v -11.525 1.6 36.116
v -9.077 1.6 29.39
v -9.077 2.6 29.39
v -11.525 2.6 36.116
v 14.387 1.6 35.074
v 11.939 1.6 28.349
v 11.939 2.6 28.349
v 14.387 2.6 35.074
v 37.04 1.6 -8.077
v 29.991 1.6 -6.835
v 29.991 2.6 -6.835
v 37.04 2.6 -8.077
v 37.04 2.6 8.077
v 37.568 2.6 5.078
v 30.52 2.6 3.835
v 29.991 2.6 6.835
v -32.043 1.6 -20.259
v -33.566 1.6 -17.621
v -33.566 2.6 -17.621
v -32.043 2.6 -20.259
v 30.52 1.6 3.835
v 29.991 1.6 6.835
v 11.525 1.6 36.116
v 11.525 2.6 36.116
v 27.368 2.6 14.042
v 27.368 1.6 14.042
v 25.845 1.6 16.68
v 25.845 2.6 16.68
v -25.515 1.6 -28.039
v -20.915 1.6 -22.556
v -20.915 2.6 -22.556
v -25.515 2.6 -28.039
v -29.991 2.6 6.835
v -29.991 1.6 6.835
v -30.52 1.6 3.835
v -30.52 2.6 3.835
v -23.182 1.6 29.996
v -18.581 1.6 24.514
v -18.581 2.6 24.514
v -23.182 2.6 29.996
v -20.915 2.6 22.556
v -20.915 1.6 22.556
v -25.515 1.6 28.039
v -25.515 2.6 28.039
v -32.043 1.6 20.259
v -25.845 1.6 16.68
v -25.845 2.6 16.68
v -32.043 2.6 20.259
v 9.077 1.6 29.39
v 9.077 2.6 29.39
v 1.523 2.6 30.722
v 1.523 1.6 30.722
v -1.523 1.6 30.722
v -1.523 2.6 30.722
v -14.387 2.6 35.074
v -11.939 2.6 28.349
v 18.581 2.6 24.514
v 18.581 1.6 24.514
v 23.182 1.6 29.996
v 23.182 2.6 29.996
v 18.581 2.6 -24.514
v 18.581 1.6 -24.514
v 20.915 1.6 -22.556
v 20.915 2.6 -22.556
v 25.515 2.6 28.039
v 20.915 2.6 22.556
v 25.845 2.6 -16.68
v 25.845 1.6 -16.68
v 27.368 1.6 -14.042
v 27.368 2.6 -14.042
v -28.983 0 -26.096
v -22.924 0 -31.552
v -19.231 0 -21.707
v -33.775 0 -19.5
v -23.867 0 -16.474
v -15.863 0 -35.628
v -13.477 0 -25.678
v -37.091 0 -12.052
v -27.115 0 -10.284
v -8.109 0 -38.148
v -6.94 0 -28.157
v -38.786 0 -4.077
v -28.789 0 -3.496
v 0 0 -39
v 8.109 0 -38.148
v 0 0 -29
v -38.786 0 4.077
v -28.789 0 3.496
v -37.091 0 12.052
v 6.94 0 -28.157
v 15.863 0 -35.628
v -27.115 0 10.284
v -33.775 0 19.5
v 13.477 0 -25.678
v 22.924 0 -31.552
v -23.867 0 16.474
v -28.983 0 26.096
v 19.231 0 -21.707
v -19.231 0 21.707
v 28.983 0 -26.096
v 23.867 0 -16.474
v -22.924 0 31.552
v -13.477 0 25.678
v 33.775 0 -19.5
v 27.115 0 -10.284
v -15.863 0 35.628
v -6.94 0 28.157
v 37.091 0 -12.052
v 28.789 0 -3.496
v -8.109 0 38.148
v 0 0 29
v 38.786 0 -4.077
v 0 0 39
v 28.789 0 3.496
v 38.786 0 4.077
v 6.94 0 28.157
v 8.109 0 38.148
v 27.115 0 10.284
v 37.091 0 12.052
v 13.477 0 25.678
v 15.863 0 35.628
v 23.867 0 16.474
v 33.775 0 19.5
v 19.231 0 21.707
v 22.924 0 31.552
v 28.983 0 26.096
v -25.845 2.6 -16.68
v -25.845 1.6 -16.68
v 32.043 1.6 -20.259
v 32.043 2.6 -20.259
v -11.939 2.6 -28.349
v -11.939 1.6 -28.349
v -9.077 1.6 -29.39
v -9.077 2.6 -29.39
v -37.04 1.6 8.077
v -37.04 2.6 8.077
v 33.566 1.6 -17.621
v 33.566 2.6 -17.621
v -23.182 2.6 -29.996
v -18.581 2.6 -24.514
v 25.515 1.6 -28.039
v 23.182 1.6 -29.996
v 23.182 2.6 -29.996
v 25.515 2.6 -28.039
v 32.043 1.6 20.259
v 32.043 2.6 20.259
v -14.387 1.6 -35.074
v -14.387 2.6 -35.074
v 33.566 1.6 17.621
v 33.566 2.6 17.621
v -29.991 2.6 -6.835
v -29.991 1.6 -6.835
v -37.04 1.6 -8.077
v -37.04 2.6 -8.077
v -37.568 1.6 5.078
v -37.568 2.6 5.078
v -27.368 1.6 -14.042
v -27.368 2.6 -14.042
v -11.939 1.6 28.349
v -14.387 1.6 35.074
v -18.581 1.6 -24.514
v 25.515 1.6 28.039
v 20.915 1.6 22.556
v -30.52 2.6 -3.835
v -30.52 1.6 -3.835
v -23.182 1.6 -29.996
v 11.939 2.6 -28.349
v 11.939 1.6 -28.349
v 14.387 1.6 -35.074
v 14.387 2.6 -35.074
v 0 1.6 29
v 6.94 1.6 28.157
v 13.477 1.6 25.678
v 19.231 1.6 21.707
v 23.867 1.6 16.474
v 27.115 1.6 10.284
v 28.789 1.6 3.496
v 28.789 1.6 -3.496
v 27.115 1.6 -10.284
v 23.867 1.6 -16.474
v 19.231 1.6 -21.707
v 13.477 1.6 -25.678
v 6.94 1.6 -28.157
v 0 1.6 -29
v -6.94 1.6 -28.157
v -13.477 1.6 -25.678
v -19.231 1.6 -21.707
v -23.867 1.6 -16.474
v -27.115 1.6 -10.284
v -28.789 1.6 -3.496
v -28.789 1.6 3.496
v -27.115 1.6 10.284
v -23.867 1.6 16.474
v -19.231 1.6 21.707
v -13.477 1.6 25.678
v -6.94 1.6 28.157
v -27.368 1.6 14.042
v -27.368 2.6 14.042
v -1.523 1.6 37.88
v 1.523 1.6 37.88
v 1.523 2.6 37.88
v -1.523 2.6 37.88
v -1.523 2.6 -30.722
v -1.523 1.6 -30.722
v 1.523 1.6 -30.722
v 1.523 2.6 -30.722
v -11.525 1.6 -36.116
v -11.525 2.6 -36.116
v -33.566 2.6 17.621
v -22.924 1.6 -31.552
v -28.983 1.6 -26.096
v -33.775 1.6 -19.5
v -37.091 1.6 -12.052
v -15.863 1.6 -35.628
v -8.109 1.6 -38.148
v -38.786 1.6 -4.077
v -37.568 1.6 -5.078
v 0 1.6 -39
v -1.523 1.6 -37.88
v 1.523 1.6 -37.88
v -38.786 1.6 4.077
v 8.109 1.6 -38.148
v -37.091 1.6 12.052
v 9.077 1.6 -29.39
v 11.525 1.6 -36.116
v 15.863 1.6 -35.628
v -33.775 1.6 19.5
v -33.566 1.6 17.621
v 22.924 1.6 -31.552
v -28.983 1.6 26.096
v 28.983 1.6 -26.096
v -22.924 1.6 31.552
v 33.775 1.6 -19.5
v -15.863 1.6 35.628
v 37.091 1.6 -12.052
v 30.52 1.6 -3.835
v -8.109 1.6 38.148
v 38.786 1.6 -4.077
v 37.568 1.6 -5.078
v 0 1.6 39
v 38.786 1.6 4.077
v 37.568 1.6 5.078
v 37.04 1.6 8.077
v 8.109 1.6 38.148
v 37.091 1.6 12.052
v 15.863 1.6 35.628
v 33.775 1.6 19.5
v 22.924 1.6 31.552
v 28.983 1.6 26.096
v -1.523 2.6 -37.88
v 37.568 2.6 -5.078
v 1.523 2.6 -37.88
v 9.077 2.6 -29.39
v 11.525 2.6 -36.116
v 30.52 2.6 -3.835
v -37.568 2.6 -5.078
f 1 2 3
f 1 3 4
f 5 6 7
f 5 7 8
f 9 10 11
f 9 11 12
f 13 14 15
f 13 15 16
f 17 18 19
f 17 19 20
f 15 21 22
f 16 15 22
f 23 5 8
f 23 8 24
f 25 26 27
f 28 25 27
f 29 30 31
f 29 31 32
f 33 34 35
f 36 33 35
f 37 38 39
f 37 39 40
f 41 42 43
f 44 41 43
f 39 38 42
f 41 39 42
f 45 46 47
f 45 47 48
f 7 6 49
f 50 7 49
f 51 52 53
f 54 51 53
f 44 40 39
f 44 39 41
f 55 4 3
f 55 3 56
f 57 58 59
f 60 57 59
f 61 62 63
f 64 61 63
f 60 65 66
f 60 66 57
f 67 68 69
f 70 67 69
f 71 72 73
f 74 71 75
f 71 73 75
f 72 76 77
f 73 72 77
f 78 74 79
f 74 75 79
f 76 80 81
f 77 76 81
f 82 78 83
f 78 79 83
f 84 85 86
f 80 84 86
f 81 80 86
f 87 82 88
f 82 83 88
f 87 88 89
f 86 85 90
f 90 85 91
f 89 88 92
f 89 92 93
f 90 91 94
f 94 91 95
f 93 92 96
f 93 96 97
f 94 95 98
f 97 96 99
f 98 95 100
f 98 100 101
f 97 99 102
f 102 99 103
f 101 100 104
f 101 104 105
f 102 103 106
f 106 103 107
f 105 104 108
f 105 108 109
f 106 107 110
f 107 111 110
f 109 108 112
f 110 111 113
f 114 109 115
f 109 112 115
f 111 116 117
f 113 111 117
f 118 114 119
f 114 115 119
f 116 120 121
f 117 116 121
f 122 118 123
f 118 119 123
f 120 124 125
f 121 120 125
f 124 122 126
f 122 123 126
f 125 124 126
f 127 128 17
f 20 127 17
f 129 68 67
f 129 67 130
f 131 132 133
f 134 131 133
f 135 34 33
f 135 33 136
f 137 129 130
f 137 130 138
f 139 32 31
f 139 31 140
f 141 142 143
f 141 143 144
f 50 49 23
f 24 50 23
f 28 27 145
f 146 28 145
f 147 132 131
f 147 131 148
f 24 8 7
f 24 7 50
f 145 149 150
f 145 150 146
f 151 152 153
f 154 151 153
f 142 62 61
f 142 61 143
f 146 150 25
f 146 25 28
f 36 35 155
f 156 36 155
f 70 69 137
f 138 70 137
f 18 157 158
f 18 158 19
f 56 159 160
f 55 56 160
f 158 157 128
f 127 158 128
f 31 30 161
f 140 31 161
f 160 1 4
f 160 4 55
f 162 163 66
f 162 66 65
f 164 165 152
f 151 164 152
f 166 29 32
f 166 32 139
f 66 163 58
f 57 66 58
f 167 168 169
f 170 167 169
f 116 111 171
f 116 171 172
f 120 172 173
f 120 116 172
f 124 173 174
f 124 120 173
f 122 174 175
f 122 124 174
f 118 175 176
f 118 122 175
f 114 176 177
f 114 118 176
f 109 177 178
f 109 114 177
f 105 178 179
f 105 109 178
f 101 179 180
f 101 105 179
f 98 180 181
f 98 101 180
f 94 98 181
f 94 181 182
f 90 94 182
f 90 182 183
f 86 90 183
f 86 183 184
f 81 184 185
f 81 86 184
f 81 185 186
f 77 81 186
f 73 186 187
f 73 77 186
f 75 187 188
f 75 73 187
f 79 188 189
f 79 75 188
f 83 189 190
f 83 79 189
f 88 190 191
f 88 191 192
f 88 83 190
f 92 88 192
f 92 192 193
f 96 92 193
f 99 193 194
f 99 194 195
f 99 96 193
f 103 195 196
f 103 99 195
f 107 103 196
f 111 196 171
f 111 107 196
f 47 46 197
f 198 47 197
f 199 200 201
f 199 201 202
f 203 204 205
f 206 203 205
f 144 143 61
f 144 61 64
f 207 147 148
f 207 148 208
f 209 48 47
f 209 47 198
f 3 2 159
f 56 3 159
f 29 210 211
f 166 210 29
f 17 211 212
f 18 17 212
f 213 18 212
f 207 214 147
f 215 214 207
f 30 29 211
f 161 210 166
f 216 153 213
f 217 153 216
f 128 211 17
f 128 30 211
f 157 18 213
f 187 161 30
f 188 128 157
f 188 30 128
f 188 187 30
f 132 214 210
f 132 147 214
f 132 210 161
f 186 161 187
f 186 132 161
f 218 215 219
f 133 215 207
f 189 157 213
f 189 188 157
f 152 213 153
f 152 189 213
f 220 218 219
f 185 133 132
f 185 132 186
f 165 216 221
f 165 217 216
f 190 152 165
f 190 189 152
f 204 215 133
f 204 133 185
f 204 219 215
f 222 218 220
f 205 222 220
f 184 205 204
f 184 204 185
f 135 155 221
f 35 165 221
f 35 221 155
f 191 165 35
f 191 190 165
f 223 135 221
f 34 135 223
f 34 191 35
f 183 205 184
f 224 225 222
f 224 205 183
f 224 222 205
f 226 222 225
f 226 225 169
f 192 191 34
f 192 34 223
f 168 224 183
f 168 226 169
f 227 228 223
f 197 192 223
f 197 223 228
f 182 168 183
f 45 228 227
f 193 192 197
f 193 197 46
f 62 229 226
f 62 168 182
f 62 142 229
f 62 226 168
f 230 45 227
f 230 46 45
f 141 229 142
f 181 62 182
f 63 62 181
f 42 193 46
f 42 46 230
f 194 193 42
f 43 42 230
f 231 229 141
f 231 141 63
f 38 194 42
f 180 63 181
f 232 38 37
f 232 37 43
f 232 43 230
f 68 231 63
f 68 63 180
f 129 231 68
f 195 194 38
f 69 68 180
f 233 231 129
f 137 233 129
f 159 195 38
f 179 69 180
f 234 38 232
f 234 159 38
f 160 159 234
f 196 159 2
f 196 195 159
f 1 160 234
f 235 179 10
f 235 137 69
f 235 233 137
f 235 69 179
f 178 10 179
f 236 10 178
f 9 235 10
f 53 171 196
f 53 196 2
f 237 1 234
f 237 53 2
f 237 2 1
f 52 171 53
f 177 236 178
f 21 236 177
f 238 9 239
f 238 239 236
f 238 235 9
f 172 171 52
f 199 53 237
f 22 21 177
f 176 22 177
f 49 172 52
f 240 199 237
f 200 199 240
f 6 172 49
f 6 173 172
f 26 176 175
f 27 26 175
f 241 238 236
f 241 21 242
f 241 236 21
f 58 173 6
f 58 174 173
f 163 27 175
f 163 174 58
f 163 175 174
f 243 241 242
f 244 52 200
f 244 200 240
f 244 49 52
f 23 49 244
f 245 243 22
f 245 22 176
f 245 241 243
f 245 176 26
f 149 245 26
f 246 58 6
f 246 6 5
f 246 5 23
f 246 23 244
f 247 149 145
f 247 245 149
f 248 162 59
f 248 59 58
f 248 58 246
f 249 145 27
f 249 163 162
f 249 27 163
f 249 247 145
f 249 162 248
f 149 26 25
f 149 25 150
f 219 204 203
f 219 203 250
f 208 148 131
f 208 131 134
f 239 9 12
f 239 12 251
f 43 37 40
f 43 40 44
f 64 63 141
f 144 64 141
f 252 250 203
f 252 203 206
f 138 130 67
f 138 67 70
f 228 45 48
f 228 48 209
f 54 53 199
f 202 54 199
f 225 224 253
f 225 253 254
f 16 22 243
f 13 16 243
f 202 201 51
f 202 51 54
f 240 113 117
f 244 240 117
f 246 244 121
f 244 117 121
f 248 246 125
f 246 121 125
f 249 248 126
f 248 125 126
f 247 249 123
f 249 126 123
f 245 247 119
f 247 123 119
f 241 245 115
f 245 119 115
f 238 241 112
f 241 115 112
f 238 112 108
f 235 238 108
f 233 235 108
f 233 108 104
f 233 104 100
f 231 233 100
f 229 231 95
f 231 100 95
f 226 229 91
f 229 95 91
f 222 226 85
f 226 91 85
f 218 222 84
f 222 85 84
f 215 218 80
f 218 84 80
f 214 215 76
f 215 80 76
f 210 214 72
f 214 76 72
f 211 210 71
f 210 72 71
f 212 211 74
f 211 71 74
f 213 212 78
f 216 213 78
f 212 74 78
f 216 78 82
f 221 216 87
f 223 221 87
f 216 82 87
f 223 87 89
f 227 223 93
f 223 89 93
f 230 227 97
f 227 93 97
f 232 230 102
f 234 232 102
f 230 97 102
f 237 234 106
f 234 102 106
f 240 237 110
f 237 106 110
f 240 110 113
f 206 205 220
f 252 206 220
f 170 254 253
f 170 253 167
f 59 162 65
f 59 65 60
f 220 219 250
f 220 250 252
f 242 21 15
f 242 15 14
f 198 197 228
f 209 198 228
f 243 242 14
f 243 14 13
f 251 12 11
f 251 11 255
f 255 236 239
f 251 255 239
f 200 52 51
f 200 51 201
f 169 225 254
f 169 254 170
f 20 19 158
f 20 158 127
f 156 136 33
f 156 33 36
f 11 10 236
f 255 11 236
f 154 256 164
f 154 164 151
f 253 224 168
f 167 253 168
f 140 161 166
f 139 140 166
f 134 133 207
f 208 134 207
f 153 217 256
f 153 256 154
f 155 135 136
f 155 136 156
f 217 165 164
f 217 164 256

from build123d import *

# Parameters (mm, degrees)
SKETCH_1_R               = 39
SKETCH_1_R_2             = 29
EXTRUDE_1_DEPTH          = 1.6
SKETCH_2_W               = 3.045590862
SKETCH_2_H               = 7.157138524
EXTRUDE_2_DEPTH          = 1
PATTERN_CIRCULAR_1_COUNT = 18


with BuildPart() as part:
    # 草图1 → 凸台-拉伸1 (new body)
    with BuildSketch(Plane(origin=(0, 0, 0), x_dir=(1, 0, 0), z_dir=(0, 1, 0))):
        with Locations(Location((0, 0, 0), (0, 0, 270))):
            Circle(SKETCH_1_R)
        with Locations(Location((0, 0, 0), (0, 0, 270))):
            Circle(SKETCH_1_R_2, mode=Mode.SUBTRACT)
    extrude(amount=EXTRUDE_1_DEPTH)

    # 草图2 → 凸台-拉伸2 (add)
    with BuildSketch(Plane(origin=(0, 1.6, 0), x_dir=(1, 0, 0), z_dir=(0, 1, 0))):
        with Locations((0, 34.300967075)):
            Rectangle(SKETCH_2_W, SKETCH_2_H)
    extrude_2 = extrude(amount=EXTRUDE_2_DEPTH)

    # 阵列(圆周)1: 凸台-拉伸2 ×18 about axis
    pattern_circular_1_axis = Axis((0, 0, 0), (0, 1, 0))
    for i in range(1, PATTERN_CIRCULAR_1_COUNT):
        add(extrude_2.rotate(pattern_circular_1_axis, i * 360 / PATTERN_CIRCULAR_1_COUNT))


solid = part.part
